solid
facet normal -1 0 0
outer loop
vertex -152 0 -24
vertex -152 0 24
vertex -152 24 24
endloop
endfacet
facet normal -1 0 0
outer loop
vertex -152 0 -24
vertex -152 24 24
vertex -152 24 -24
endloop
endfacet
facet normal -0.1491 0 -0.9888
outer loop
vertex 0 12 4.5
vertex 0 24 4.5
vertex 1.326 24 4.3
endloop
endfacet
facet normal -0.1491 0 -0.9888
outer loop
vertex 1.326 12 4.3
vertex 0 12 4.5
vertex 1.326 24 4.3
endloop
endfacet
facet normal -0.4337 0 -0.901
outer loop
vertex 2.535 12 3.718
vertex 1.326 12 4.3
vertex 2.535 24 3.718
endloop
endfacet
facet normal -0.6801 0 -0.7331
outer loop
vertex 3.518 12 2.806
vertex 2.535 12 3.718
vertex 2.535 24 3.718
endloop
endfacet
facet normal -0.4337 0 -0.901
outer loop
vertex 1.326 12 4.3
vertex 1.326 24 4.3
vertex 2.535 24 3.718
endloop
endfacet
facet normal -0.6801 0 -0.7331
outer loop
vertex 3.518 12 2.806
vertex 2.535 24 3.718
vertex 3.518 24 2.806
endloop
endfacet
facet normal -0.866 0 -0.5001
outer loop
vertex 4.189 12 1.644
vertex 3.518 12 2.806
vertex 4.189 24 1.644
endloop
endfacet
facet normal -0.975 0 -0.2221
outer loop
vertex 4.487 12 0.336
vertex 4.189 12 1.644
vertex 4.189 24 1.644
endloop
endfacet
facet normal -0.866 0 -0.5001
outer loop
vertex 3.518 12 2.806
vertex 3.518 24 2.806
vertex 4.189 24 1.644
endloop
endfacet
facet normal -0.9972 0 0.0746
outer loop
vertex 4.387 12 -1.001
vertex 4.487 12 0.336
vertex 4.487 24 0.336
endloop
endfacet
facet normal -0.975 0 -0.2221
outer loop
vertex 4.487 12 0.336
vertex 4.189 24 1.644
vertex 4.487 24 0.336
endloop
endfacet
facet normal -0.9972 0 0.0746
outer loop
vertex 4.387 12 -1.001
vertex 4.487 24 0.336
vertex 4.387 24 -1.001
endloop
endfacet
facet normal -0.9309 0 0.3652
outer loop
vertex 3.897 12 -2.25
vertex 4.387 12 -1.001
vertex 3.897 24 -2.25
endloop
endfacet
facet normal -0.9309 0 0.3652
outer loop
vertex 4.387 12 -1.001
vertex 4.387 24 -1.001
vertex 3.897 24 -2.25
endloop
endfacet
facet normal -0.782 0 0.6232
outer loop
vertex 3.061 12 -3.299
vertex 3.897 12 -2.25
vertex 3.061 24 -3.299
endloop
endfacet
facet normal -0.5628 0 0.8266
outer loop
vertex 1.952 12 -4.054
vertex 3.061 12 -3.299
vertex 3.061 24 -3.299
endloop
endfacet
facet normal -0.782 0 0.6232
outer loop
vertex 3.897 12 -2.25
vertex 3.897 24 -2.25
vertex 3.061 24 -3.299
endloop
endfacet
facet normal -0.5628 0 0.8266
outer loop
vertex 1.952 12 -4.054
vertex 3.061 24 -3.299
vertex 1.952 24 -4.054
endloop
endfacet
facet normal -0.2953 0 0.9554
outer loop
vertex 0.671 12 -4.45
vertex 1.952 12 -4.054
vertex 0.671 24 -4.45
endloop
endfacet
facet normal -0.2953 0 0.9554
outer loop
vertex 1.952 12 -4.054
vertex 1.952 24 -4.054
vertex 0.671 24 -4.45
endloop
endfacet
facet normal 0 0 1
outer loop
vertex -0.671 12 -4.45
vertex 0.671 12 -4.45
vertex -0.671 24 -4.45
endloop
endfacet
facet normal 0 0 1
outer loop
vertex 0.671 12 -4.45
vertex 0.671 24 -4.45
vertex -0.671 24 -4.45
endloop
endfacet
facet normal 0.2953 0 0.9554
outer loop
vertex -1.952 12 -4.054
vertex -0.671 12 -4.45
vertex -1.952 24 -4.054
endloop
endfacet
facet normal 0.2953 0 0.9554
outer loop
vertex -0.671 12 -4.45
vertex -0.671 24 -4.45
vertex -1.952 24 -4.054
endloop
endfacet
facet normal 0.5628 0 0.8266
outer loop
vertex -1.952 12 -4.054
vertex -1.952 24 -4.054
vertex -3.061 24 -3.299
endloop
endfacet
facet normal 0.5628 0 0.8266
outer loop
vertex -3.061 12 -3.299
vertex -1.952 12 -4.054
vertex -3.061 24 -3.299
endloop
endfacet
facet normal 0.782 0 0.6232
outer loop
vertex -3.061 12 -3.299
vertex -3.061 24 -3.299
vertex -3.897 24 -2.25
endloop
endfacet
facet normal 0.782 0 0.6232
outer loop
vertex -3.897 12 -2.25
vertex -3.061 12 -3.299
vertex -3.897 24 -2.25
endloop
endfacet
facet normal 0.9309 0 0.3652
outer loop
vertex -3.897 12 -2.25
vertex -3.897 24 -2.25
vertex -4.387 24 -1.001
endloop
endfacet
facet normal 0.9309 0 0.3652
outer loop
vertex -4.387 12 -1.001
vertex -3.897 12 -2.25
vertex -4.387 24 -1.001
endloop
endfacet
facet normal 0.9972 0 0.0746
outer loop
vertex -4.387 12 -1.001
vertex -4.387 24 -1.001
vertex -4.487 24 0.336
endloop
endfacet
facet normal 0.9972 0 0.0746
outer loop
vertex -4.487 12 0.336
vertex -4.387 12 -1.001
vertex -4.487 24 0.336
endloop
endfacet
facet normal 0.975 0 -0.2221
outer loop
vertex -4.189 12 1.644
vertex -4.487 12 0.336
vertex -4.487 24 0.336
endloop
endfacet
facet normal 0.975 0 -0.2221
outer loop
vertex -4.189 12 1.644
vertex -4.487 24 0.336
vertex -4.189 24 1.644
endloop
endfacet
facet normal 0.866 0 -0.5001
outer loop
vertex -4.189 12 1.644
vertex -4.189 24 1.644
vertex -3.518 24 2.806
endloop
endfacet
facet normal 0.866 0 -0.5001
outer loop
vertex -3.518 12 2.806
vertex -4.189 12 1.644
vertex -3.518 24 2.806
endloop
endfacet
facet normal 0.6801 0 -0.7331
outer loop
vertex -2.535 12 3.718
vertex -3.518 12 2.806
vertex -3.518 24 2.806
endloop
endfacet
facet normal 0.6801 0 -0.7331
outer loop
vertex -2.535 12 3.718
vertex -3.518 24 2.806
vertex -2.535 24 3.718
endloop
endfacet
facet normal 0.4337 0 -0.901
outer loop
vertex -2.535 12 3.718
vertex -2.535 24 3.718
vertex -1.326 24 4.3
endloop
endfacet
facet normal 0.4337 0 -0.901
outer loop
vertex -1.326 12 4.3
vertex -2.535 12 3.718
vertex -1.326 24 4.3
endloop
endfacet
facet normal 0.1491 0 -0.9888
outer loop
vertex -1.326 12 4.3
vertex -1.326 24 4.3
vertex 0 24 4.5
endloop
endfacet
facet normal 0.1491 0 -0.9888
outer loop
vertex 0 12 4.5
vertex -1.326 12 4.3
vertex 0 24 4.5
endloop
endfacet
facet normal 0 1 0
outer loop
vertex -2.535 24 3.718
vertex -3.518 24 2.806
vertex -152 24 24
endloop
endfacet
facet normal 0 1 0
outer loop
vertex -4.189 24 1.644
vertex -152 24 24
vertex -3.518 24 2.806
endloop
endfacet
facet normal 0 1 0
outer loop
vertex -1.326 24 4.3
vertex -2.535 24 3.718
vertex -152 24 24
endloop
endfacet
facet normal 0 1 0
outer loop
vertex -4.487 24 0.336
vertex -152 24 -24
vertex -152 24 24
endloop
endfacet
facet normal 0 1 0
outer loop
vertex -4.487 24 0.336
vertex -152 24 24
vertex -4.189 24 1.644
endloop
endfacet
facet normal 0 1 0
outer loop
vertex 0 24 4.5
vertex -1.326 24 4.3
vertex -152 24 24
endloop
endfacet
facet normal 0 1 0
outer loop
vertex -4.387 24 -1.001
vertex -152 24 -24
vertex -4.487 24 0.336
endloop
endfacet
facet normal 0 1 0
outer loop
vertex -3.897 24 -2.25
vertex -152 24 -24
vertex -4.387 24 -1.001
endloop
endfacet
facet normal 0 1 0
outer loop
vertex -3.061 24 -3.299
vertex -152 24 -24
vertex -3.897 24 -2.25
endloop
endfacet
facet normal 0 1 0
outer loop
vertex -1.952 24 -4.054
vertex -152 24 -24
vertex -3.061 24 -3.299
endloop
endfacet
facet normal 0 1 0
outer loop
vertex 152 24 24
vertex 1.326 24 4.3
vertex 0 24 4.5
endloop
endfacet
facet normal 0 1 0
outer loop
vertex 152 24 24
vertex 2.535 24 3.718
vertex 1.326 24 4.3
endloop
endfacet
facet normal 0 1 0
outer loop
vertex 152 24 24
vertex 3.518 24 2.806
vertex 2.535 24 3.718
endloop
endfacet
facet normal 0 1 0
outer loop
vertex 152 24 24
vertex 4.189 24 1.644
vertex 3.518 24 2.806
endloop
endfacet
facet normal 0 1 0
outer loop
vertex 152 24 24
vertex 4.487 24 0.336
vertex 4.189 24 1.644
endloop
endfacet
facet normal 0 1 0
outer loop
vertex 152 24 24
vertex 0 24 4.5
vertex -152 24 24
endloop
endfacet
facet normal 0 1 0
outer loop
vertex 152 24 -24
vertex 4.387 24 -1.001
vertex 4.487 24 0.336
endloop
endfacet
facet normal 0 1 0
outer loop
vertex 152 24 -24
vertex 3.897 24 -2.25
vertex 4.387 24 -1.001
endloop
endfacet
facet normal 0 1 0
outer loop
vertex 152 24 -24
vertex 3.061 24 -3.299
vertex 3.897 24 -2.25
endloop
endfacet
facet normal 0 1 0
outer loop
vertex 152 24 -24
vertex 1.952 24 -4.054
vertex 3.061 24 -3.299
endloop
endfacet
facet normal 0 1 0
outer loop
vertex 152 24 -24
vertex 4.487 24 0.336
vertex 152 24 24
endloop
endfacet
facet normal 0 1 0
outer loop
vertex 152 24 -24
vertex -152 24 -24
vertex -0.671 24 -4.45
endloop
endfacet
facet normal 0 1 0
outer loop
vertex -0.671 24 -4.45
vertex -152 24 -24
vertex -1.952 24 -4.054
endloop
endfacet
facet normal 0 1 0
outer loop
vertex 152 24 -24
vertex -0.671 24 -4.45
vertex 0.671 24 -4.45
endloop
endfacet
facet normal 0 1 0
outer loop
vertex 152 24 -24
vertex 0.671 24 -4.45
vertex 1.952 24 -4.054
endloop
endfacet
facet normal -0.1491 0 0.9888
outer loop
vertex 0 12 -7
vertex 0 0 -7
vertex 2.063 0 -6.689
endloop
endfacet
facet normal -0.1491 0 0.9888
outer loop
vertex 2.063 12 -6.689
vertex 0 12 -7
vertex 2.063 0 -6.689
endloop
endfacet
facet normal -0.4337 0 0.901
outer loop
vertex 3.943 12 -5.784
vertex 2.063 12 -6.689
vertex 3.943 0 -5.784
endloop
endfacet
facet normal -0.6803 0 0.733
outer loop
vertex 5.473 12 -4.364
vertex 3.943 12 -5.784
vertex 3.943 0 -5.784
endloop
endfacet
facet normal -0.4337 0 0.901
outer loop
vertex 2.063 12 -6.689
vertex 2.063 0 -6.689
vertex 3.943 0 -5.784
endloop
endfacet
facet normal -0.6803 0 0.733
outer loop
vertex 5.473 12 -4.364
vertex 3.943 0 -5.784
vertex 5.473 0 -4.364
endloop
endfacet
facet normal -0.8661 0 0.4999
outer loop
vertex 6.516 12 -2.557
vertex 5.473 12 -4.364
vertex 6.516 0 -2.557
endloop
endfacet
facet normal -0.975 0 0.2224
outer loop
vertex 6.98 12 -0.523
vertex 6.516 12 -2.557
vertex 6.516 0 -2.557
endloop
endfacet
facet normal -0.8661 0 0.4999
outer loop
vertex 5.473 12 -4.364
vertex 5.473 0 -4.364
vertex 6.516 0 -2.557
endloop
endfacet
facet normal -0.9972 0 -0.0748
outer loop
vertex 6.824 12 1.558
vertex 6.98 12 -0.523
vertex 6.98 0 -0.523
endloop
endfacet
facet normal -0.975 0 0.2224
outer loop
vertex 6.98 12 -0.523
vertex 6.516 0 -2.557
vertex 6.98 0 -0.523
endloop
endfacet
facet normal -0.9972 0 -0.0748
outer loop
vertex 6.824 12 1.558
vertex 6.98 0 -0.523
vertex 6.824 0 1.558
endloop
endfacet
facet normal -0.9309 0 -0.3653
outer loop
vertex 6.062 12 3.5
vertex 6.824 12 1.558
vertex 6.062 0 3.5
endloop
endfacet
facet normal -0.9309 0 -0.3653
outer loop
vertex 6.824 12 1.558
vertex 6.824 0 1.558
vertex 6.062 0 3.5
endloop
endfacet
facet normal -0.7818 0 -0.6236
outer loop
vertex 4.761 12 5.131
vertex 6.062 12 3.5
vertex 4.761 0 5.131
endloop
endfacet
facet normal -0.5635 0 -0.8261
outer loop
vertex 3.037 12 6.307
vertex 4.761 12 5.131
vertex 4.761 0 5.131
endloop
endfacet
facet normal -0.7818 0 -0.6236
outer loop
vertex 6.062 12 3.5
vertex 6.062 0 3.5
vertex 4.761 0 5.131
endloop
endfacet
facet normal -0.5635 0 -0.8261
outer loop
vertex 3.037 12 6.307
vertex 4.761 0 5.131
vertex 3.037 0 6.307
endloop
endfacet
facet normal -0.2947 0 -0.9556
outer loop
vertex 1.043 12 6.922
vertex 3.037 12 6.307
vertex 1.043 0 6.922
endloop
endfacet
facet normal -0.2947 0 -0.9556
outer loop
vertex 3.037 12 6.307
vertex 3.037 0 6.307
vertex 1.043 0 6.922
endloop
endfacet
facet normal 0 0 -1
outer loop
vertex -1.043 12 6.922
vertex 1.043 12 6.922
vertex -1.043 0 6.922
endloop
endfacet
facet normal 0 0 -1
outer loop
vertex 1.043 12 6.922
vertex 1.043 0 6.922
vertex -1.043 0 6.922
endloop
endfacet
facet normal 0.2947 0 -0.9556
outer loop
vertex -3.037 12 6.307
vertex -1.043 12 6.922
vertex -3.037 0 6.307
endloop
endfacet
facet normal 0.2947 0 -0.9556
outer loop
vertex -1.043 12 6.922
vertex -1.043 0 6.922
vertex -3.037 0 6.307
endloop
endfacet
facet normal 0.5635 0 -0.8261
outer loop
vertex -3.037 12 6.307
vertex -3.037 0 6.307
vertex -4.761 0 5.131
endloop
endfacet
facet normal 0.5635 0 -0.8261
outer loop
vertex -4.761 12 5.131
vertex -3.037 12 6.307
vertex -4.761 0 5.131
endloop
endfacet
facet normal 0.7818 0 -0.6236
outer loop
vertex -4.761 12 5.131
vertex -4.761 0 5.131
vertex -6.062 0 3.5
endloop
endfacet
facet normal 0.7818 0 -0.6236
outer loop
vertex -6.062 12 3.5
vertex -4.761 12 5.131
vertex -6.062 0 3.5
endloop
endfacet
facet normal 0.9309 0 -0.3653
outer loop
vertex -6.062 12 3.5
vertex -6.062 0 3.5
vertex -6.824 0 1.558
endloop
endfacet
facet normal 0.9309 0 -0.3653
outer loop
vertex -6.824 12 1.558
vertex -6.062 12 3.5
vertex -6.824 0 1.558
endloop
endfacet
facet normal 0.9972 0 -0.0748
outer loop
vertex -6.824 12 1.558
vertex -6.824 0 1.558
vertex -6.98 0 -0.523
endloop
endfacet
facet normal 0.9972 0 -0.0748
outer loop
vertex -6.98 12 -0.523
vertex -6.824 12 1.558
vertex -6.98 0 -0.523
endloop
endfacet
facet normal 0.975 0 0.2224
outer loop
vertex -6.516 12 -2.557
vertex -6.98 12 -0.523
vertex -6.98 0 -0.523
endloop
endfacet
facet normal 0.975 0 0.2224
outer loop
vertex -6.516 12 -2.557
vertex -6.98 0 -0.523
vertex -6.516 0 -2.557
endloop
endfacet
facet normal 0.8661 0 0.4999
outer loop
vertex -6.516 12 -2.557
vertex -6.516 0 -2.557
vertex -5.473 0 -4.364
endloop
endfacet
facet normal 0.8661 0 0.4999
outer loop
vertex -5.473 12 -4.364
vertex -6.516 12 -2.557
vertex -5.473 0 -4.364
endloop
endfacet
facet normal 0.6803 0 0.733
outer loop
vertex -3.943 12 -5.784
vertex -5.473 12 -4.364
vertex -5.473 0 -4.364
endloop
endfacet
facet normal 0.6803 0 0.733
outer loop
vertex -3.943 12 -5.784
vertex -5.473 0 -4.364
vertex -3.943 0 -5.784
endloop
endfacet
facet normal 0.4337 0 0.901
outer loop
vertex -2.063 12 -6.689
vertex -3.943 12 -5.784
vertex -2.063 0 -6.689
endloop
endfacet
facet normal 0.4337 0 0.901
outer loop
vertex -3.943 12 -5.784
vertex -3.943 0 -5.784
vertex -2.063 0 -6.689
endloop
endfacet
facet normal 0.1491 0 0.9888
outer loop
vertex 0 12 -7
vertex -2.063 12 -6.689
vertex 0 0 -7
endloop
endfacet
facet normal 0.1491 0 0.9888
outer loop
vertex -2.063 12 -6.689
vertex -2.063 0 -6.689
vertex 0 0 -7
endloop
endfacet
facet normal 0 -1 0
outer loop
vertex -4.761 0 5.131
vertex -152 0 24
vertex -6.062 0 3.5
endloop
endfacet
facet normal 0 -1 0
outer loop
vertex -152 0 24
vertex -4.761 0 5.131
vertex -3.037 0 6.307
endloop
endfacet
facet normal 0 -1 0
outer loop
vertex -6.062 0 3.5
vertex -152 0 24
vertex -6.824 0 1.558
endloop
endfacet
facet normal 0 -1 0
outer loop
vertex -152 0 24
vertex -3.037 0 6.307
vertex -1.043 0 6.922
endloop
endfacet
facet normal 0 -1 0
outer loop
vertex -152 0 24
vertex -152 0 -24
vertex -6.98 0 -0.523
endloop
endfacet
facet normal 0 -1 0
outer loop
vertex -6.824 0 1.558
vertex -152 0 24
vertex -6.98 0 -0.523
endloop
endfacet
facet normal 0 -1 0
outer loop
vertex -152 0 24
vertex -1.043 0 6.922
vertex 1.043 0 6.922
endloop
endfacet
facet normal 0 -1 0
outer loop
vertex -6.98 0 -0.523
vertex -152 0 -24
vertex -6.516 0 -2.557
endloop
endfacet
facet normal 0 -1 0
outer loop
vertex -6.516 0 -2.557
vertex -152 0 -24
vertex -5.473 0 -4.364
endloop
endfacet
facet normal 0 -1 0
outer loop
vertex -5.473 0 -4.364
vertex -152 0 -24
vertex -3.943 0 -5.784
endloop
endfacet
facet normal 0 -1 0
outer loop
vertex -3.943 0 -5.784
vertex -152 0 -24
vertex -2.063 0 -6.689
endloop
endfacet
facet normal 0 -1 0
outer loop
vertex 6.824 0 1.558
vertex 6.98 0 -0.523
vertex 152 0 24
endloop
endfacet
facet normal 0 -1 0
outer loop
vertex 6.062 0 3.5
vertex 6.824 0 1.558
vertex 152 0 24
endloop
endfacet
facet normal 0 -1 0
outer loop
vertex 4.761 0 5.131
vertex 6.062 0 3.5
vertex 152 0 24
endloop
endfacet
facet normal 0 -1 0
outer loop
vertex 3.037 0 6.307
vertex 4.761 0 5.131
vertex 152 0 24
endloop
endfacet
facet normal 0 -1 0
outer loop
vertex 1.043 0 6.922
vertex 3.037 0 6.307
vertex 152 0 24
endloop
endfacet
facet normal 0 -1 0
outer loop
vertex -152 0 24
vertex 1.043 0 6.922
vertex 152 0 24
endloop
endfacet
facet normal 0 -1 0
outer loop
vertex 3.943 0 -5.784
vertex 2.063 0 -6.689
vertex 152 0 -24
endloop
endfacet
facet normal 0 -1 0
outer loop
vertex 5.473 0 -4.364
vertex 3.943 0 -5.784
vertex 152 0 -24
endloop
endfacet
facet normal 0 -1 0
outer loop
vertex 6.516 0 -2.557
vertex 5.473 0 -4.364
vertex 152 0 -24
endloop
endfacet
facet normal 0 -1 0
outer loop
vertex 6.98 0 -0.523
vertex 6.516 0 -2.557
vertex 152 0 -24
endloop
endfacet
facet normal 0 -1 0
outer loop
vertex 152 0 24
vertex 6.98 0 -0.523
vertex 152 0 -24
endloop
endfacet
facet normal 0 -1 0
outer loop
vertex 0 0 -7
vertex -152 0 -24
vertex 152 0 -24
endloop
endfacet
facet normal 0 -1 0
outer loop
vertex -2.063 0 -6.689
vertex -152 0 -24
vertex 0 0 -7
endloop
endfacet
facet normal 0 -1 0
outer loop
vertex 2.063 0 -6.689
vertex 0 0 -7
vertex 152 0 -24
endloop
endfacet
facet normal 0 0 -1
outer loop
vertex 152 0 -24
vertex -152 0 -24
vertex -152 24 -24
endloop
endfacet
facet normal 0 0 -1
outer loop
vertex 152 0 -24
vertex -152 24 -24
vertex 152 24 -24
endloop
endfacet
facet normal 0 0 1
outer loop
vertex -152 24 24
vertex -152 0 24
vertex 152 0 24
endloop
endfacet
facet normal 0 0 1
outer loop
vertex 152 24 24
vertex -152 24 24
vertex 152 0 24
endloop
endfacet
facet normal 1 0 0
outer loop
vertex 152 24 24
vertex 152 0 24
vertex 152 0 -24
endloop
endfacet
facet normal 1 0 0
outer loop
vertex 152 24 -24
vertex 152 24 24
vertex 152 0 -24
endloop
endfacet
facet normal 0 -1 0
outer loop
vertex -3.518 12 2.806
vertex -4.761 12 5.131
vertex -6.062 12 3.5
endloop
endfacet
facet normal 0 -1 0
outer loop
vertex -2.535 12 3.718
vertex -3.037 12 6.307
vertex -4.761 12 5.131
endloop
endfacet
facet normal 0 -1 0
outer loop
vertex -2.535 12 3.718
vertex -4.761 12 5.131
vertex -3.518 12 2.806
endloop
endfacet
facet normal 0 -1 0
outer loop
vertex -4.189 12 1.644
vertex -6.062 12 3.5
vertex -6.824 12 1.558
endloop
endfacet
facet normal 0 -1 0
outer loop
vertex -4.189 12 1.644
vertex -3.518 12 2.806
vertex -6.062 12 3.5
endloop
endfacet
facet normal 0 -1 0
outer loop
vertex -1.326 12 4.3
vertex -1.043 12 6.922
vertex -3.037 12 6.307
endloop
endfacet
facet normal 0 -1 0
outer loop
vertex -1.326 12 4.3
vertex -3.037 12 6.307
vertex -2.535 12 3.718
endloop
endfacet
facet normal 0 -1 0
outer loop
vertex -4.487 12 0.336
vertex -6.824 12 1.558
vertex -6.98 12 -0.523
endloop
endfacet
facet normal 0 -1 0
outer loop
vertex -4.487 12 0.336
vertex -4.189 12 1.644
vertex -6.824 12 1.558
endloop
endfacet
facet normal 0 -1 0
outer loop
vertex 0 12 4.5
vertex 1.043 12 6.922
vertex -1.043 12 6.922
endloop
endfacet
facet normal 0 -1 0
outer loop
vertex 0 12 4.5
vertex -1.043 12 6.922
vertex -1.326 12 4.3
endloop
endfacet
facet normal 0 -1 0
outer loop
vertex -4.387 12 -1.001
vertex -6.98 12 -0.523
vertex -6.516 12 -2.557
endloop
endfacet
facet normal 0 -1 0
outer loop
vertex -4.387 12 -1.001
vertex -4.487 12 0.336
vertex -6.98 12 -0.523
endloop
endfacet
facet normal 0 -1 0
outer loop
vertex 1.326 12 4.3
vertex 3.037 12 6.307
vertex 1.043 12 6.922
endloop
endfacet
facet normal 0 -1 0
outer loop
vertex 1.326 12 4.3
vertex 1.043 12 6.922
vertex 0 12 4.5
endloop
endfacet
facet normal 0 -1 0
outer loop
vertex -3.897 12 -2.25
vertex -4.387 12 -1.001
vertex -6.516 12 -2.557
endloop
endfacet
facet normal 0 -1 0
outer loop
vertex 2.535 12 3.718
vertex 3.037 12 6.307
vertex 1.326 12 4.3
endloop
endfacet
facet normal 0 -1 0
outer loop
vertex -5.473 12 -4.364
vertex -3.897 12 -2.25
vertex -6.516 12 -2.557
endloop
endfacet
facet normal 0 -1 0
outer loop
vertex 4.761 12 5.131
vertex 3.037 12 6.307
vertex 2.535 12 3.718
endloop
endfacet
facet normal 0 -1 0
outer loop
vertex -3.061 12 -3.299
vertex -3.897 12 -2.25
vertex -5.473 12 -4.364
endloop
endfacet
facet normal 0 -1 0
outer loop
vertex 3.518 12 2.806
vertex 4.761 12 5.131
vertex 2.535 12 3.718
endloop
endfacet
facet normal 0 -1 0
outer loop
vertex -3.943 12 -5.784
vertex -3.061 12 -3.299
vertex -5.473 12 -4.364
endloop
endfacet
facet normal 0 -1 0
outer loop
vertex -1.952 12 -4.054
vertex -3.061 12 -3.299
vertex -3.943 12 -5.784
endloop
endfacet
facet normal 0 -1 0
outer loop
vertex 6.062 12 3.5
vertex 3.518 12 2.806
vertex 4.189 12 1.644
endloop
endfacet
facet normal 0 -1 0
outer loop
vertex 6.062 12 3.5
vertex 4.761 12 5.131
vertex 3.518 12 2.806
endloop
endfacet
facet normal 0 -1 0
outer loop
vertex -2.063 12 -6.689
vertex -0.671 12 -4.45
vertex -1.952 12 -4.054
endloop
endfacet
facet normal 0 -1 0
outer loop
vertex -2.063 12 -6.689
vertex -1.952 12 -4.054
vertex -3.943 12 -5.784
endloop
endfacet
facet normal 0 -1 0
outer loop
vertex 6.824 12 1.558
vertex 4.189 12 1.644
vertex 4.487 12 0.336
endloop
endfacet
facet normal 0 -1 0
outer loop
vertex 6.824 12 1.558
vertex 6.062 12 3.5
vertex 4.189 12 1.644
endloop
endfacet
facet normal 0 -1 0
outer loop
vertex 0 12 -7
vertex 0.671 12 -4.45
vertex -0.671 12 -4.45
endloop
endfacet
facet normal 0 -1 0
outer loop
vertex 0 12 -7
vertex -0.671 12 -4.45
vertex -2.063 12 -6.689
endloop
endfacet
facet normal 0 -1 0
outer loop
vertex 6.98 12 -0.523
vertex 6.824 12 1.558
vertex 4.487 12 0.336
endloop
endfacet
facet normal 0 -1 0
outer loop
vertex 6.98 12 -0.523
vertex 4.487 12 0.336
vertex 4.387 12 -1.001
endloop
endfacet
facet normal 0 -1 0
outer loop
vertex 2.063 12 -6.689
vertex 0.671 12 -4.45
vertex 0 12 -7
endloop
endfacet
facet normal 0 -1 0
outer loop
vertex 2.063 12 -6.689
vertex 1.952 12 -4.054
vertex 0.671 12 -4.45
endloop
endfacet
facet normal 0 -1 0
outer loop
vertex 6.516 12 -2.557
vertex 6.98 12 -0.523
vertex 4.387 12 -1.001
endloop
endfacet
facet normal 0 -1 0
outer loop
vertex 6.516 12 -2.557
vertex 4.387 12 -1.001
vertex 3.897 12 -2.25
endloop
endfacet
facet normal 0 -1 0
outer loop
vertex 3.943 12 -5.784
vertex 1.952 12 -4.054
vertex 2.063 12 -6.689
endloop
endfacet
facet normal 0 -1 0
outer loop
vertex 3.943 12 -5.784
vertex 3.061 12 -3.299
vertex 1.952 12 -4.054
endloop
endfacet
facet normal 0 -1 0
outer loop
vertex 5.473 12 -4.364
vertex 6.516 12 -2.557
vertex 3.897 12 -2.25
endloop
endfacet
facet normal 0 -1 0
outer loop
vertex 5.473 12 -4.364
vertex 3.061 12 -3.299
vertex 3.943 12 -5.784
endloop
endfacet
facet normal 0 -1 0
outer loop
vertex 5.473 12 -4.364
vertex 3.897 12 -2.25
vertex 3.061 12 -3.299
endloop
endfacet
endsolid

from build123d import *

# Parameters (mm, degrees)
ESQUISSE1_W             = 304
ESQUISSE1_H             = 48
BOSS_EXTRU_1_DEPTH      = 24
ESQUISSE2_R             = 4.5
ENL_V_MAT_EXTRU_1_DEPTH = 156.743378671
ESQUISSE3_R             = 7
ENL_V_MAT_EXTRU_2_DEPTH = 12


with BuildPart() as part:
    # Esquisse1 → Boss.-Extru.1 (new body)
    with BuildSketch(Plane(origin=(0, 0, 0), x_dir=(1, 0, 0), z_dir=(0, 1, 0))):
        Rectangle(ESQUISSE1_W, ESQUISSE1_H)
    extrude(amount=BOSS_EXTRU_1_DEPTH)

    # Esquisse2 → Enlèv. mat.-Extru.1 (cut, through all)
    with BuildSketch(Plane(origin=(0, 24, 0), x_dir=(1, 0, 0), z_dir=(0, 1, 0))):
        with Locations(Location((0, 0, 0), (0, 0, 270))):
            Circle(ESQUISSE2_R)
    extrude(amount=-ENL_V_MAT_EXTRU_1_DEPTH, mode=Mode.SUBTRACT)

    # Esquisse3 → Enlèv. mat.-Extru.2 (cut)
    with BuildSketch(Plane.XZ):
        with Locations(Location((0, 0, 0), (0, 0, 270))):
            Circle(ESQUISSE3_R)
    extrude(amount=-ENL_V_MAT_EXTRU_2_DEPTH, mode=Mode.SUBTRACT)


solid = part.part
